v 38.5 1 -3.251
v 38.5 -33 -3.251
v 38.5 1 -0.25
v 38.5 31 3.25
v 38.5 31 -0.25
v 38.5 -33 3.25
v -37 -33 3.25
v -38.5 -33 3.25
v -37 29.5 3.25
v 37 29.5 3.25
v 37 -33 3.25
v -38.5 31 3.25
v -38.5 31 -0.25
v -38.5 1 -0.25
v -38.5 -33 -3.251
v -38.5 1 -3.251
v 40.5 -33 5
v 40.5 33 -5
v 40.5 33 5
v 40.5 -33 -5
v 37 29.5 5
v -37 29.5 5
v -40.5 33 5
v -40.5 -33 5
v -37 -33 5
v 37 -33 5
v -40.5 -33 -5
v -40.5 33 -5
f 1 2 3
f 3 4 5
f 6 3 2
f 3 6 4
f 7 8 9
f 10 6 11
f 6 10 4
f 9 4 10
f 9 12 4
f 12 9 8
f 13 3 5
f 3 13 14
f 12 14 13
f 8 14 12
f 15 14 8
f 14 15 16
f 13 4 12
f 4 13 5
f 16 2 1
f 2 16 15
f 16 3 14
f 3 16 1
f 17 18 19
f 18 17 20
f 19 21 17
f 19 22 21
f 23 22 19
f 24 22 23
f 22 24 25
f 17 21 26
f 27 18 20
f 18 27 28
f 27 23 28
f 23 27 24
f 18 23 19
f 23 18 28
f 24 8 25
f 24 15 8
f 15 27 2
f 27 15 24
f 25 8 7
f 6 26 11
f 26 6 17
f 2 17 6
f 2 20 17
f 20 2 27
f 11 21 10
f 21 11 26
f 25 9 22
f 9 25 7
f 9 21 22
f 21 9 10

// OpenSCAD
xdisp = 77;
ydisp = 64-2;
zdisp = 3.5;  // thickness of LCD itself
ynopcb = 32; // length without PCB
ycoverpcb = 47; // part of y-lcd covered with PCB
zlcdpcb = 6; // thickness of LCD including PCB

xview = 74; // view opening x
yview = 57; // view opening y

wthick = 2; // wall thickness

module dispouter()
{
  cube([xdisp+2*wthick, ydisp+2*wthick, zlcdpcb+2*wthick], center=true);
}

module dispcutter()
{
  addcut = 10;
  cube([xdisp,addcut + ydisp, zdisp], center=true);
  translate([0,-addcut -ydisp/2+ycoverpcb/2,-zdisp/2+0*zlcdpcb/2-0.001])
    cube([xdisp,ycoverpcb,zlcdpcb],center=true);
}

module dispcover()
{
  difference()
  {
    dispouter();
    // cut inside
    translate([0,-5,1.5])
      dispcutter();
    // cut opening
    translate([0,-3,6])
      cube([xview,yview+8,10],center=true);
  }   
}


dispcover();
